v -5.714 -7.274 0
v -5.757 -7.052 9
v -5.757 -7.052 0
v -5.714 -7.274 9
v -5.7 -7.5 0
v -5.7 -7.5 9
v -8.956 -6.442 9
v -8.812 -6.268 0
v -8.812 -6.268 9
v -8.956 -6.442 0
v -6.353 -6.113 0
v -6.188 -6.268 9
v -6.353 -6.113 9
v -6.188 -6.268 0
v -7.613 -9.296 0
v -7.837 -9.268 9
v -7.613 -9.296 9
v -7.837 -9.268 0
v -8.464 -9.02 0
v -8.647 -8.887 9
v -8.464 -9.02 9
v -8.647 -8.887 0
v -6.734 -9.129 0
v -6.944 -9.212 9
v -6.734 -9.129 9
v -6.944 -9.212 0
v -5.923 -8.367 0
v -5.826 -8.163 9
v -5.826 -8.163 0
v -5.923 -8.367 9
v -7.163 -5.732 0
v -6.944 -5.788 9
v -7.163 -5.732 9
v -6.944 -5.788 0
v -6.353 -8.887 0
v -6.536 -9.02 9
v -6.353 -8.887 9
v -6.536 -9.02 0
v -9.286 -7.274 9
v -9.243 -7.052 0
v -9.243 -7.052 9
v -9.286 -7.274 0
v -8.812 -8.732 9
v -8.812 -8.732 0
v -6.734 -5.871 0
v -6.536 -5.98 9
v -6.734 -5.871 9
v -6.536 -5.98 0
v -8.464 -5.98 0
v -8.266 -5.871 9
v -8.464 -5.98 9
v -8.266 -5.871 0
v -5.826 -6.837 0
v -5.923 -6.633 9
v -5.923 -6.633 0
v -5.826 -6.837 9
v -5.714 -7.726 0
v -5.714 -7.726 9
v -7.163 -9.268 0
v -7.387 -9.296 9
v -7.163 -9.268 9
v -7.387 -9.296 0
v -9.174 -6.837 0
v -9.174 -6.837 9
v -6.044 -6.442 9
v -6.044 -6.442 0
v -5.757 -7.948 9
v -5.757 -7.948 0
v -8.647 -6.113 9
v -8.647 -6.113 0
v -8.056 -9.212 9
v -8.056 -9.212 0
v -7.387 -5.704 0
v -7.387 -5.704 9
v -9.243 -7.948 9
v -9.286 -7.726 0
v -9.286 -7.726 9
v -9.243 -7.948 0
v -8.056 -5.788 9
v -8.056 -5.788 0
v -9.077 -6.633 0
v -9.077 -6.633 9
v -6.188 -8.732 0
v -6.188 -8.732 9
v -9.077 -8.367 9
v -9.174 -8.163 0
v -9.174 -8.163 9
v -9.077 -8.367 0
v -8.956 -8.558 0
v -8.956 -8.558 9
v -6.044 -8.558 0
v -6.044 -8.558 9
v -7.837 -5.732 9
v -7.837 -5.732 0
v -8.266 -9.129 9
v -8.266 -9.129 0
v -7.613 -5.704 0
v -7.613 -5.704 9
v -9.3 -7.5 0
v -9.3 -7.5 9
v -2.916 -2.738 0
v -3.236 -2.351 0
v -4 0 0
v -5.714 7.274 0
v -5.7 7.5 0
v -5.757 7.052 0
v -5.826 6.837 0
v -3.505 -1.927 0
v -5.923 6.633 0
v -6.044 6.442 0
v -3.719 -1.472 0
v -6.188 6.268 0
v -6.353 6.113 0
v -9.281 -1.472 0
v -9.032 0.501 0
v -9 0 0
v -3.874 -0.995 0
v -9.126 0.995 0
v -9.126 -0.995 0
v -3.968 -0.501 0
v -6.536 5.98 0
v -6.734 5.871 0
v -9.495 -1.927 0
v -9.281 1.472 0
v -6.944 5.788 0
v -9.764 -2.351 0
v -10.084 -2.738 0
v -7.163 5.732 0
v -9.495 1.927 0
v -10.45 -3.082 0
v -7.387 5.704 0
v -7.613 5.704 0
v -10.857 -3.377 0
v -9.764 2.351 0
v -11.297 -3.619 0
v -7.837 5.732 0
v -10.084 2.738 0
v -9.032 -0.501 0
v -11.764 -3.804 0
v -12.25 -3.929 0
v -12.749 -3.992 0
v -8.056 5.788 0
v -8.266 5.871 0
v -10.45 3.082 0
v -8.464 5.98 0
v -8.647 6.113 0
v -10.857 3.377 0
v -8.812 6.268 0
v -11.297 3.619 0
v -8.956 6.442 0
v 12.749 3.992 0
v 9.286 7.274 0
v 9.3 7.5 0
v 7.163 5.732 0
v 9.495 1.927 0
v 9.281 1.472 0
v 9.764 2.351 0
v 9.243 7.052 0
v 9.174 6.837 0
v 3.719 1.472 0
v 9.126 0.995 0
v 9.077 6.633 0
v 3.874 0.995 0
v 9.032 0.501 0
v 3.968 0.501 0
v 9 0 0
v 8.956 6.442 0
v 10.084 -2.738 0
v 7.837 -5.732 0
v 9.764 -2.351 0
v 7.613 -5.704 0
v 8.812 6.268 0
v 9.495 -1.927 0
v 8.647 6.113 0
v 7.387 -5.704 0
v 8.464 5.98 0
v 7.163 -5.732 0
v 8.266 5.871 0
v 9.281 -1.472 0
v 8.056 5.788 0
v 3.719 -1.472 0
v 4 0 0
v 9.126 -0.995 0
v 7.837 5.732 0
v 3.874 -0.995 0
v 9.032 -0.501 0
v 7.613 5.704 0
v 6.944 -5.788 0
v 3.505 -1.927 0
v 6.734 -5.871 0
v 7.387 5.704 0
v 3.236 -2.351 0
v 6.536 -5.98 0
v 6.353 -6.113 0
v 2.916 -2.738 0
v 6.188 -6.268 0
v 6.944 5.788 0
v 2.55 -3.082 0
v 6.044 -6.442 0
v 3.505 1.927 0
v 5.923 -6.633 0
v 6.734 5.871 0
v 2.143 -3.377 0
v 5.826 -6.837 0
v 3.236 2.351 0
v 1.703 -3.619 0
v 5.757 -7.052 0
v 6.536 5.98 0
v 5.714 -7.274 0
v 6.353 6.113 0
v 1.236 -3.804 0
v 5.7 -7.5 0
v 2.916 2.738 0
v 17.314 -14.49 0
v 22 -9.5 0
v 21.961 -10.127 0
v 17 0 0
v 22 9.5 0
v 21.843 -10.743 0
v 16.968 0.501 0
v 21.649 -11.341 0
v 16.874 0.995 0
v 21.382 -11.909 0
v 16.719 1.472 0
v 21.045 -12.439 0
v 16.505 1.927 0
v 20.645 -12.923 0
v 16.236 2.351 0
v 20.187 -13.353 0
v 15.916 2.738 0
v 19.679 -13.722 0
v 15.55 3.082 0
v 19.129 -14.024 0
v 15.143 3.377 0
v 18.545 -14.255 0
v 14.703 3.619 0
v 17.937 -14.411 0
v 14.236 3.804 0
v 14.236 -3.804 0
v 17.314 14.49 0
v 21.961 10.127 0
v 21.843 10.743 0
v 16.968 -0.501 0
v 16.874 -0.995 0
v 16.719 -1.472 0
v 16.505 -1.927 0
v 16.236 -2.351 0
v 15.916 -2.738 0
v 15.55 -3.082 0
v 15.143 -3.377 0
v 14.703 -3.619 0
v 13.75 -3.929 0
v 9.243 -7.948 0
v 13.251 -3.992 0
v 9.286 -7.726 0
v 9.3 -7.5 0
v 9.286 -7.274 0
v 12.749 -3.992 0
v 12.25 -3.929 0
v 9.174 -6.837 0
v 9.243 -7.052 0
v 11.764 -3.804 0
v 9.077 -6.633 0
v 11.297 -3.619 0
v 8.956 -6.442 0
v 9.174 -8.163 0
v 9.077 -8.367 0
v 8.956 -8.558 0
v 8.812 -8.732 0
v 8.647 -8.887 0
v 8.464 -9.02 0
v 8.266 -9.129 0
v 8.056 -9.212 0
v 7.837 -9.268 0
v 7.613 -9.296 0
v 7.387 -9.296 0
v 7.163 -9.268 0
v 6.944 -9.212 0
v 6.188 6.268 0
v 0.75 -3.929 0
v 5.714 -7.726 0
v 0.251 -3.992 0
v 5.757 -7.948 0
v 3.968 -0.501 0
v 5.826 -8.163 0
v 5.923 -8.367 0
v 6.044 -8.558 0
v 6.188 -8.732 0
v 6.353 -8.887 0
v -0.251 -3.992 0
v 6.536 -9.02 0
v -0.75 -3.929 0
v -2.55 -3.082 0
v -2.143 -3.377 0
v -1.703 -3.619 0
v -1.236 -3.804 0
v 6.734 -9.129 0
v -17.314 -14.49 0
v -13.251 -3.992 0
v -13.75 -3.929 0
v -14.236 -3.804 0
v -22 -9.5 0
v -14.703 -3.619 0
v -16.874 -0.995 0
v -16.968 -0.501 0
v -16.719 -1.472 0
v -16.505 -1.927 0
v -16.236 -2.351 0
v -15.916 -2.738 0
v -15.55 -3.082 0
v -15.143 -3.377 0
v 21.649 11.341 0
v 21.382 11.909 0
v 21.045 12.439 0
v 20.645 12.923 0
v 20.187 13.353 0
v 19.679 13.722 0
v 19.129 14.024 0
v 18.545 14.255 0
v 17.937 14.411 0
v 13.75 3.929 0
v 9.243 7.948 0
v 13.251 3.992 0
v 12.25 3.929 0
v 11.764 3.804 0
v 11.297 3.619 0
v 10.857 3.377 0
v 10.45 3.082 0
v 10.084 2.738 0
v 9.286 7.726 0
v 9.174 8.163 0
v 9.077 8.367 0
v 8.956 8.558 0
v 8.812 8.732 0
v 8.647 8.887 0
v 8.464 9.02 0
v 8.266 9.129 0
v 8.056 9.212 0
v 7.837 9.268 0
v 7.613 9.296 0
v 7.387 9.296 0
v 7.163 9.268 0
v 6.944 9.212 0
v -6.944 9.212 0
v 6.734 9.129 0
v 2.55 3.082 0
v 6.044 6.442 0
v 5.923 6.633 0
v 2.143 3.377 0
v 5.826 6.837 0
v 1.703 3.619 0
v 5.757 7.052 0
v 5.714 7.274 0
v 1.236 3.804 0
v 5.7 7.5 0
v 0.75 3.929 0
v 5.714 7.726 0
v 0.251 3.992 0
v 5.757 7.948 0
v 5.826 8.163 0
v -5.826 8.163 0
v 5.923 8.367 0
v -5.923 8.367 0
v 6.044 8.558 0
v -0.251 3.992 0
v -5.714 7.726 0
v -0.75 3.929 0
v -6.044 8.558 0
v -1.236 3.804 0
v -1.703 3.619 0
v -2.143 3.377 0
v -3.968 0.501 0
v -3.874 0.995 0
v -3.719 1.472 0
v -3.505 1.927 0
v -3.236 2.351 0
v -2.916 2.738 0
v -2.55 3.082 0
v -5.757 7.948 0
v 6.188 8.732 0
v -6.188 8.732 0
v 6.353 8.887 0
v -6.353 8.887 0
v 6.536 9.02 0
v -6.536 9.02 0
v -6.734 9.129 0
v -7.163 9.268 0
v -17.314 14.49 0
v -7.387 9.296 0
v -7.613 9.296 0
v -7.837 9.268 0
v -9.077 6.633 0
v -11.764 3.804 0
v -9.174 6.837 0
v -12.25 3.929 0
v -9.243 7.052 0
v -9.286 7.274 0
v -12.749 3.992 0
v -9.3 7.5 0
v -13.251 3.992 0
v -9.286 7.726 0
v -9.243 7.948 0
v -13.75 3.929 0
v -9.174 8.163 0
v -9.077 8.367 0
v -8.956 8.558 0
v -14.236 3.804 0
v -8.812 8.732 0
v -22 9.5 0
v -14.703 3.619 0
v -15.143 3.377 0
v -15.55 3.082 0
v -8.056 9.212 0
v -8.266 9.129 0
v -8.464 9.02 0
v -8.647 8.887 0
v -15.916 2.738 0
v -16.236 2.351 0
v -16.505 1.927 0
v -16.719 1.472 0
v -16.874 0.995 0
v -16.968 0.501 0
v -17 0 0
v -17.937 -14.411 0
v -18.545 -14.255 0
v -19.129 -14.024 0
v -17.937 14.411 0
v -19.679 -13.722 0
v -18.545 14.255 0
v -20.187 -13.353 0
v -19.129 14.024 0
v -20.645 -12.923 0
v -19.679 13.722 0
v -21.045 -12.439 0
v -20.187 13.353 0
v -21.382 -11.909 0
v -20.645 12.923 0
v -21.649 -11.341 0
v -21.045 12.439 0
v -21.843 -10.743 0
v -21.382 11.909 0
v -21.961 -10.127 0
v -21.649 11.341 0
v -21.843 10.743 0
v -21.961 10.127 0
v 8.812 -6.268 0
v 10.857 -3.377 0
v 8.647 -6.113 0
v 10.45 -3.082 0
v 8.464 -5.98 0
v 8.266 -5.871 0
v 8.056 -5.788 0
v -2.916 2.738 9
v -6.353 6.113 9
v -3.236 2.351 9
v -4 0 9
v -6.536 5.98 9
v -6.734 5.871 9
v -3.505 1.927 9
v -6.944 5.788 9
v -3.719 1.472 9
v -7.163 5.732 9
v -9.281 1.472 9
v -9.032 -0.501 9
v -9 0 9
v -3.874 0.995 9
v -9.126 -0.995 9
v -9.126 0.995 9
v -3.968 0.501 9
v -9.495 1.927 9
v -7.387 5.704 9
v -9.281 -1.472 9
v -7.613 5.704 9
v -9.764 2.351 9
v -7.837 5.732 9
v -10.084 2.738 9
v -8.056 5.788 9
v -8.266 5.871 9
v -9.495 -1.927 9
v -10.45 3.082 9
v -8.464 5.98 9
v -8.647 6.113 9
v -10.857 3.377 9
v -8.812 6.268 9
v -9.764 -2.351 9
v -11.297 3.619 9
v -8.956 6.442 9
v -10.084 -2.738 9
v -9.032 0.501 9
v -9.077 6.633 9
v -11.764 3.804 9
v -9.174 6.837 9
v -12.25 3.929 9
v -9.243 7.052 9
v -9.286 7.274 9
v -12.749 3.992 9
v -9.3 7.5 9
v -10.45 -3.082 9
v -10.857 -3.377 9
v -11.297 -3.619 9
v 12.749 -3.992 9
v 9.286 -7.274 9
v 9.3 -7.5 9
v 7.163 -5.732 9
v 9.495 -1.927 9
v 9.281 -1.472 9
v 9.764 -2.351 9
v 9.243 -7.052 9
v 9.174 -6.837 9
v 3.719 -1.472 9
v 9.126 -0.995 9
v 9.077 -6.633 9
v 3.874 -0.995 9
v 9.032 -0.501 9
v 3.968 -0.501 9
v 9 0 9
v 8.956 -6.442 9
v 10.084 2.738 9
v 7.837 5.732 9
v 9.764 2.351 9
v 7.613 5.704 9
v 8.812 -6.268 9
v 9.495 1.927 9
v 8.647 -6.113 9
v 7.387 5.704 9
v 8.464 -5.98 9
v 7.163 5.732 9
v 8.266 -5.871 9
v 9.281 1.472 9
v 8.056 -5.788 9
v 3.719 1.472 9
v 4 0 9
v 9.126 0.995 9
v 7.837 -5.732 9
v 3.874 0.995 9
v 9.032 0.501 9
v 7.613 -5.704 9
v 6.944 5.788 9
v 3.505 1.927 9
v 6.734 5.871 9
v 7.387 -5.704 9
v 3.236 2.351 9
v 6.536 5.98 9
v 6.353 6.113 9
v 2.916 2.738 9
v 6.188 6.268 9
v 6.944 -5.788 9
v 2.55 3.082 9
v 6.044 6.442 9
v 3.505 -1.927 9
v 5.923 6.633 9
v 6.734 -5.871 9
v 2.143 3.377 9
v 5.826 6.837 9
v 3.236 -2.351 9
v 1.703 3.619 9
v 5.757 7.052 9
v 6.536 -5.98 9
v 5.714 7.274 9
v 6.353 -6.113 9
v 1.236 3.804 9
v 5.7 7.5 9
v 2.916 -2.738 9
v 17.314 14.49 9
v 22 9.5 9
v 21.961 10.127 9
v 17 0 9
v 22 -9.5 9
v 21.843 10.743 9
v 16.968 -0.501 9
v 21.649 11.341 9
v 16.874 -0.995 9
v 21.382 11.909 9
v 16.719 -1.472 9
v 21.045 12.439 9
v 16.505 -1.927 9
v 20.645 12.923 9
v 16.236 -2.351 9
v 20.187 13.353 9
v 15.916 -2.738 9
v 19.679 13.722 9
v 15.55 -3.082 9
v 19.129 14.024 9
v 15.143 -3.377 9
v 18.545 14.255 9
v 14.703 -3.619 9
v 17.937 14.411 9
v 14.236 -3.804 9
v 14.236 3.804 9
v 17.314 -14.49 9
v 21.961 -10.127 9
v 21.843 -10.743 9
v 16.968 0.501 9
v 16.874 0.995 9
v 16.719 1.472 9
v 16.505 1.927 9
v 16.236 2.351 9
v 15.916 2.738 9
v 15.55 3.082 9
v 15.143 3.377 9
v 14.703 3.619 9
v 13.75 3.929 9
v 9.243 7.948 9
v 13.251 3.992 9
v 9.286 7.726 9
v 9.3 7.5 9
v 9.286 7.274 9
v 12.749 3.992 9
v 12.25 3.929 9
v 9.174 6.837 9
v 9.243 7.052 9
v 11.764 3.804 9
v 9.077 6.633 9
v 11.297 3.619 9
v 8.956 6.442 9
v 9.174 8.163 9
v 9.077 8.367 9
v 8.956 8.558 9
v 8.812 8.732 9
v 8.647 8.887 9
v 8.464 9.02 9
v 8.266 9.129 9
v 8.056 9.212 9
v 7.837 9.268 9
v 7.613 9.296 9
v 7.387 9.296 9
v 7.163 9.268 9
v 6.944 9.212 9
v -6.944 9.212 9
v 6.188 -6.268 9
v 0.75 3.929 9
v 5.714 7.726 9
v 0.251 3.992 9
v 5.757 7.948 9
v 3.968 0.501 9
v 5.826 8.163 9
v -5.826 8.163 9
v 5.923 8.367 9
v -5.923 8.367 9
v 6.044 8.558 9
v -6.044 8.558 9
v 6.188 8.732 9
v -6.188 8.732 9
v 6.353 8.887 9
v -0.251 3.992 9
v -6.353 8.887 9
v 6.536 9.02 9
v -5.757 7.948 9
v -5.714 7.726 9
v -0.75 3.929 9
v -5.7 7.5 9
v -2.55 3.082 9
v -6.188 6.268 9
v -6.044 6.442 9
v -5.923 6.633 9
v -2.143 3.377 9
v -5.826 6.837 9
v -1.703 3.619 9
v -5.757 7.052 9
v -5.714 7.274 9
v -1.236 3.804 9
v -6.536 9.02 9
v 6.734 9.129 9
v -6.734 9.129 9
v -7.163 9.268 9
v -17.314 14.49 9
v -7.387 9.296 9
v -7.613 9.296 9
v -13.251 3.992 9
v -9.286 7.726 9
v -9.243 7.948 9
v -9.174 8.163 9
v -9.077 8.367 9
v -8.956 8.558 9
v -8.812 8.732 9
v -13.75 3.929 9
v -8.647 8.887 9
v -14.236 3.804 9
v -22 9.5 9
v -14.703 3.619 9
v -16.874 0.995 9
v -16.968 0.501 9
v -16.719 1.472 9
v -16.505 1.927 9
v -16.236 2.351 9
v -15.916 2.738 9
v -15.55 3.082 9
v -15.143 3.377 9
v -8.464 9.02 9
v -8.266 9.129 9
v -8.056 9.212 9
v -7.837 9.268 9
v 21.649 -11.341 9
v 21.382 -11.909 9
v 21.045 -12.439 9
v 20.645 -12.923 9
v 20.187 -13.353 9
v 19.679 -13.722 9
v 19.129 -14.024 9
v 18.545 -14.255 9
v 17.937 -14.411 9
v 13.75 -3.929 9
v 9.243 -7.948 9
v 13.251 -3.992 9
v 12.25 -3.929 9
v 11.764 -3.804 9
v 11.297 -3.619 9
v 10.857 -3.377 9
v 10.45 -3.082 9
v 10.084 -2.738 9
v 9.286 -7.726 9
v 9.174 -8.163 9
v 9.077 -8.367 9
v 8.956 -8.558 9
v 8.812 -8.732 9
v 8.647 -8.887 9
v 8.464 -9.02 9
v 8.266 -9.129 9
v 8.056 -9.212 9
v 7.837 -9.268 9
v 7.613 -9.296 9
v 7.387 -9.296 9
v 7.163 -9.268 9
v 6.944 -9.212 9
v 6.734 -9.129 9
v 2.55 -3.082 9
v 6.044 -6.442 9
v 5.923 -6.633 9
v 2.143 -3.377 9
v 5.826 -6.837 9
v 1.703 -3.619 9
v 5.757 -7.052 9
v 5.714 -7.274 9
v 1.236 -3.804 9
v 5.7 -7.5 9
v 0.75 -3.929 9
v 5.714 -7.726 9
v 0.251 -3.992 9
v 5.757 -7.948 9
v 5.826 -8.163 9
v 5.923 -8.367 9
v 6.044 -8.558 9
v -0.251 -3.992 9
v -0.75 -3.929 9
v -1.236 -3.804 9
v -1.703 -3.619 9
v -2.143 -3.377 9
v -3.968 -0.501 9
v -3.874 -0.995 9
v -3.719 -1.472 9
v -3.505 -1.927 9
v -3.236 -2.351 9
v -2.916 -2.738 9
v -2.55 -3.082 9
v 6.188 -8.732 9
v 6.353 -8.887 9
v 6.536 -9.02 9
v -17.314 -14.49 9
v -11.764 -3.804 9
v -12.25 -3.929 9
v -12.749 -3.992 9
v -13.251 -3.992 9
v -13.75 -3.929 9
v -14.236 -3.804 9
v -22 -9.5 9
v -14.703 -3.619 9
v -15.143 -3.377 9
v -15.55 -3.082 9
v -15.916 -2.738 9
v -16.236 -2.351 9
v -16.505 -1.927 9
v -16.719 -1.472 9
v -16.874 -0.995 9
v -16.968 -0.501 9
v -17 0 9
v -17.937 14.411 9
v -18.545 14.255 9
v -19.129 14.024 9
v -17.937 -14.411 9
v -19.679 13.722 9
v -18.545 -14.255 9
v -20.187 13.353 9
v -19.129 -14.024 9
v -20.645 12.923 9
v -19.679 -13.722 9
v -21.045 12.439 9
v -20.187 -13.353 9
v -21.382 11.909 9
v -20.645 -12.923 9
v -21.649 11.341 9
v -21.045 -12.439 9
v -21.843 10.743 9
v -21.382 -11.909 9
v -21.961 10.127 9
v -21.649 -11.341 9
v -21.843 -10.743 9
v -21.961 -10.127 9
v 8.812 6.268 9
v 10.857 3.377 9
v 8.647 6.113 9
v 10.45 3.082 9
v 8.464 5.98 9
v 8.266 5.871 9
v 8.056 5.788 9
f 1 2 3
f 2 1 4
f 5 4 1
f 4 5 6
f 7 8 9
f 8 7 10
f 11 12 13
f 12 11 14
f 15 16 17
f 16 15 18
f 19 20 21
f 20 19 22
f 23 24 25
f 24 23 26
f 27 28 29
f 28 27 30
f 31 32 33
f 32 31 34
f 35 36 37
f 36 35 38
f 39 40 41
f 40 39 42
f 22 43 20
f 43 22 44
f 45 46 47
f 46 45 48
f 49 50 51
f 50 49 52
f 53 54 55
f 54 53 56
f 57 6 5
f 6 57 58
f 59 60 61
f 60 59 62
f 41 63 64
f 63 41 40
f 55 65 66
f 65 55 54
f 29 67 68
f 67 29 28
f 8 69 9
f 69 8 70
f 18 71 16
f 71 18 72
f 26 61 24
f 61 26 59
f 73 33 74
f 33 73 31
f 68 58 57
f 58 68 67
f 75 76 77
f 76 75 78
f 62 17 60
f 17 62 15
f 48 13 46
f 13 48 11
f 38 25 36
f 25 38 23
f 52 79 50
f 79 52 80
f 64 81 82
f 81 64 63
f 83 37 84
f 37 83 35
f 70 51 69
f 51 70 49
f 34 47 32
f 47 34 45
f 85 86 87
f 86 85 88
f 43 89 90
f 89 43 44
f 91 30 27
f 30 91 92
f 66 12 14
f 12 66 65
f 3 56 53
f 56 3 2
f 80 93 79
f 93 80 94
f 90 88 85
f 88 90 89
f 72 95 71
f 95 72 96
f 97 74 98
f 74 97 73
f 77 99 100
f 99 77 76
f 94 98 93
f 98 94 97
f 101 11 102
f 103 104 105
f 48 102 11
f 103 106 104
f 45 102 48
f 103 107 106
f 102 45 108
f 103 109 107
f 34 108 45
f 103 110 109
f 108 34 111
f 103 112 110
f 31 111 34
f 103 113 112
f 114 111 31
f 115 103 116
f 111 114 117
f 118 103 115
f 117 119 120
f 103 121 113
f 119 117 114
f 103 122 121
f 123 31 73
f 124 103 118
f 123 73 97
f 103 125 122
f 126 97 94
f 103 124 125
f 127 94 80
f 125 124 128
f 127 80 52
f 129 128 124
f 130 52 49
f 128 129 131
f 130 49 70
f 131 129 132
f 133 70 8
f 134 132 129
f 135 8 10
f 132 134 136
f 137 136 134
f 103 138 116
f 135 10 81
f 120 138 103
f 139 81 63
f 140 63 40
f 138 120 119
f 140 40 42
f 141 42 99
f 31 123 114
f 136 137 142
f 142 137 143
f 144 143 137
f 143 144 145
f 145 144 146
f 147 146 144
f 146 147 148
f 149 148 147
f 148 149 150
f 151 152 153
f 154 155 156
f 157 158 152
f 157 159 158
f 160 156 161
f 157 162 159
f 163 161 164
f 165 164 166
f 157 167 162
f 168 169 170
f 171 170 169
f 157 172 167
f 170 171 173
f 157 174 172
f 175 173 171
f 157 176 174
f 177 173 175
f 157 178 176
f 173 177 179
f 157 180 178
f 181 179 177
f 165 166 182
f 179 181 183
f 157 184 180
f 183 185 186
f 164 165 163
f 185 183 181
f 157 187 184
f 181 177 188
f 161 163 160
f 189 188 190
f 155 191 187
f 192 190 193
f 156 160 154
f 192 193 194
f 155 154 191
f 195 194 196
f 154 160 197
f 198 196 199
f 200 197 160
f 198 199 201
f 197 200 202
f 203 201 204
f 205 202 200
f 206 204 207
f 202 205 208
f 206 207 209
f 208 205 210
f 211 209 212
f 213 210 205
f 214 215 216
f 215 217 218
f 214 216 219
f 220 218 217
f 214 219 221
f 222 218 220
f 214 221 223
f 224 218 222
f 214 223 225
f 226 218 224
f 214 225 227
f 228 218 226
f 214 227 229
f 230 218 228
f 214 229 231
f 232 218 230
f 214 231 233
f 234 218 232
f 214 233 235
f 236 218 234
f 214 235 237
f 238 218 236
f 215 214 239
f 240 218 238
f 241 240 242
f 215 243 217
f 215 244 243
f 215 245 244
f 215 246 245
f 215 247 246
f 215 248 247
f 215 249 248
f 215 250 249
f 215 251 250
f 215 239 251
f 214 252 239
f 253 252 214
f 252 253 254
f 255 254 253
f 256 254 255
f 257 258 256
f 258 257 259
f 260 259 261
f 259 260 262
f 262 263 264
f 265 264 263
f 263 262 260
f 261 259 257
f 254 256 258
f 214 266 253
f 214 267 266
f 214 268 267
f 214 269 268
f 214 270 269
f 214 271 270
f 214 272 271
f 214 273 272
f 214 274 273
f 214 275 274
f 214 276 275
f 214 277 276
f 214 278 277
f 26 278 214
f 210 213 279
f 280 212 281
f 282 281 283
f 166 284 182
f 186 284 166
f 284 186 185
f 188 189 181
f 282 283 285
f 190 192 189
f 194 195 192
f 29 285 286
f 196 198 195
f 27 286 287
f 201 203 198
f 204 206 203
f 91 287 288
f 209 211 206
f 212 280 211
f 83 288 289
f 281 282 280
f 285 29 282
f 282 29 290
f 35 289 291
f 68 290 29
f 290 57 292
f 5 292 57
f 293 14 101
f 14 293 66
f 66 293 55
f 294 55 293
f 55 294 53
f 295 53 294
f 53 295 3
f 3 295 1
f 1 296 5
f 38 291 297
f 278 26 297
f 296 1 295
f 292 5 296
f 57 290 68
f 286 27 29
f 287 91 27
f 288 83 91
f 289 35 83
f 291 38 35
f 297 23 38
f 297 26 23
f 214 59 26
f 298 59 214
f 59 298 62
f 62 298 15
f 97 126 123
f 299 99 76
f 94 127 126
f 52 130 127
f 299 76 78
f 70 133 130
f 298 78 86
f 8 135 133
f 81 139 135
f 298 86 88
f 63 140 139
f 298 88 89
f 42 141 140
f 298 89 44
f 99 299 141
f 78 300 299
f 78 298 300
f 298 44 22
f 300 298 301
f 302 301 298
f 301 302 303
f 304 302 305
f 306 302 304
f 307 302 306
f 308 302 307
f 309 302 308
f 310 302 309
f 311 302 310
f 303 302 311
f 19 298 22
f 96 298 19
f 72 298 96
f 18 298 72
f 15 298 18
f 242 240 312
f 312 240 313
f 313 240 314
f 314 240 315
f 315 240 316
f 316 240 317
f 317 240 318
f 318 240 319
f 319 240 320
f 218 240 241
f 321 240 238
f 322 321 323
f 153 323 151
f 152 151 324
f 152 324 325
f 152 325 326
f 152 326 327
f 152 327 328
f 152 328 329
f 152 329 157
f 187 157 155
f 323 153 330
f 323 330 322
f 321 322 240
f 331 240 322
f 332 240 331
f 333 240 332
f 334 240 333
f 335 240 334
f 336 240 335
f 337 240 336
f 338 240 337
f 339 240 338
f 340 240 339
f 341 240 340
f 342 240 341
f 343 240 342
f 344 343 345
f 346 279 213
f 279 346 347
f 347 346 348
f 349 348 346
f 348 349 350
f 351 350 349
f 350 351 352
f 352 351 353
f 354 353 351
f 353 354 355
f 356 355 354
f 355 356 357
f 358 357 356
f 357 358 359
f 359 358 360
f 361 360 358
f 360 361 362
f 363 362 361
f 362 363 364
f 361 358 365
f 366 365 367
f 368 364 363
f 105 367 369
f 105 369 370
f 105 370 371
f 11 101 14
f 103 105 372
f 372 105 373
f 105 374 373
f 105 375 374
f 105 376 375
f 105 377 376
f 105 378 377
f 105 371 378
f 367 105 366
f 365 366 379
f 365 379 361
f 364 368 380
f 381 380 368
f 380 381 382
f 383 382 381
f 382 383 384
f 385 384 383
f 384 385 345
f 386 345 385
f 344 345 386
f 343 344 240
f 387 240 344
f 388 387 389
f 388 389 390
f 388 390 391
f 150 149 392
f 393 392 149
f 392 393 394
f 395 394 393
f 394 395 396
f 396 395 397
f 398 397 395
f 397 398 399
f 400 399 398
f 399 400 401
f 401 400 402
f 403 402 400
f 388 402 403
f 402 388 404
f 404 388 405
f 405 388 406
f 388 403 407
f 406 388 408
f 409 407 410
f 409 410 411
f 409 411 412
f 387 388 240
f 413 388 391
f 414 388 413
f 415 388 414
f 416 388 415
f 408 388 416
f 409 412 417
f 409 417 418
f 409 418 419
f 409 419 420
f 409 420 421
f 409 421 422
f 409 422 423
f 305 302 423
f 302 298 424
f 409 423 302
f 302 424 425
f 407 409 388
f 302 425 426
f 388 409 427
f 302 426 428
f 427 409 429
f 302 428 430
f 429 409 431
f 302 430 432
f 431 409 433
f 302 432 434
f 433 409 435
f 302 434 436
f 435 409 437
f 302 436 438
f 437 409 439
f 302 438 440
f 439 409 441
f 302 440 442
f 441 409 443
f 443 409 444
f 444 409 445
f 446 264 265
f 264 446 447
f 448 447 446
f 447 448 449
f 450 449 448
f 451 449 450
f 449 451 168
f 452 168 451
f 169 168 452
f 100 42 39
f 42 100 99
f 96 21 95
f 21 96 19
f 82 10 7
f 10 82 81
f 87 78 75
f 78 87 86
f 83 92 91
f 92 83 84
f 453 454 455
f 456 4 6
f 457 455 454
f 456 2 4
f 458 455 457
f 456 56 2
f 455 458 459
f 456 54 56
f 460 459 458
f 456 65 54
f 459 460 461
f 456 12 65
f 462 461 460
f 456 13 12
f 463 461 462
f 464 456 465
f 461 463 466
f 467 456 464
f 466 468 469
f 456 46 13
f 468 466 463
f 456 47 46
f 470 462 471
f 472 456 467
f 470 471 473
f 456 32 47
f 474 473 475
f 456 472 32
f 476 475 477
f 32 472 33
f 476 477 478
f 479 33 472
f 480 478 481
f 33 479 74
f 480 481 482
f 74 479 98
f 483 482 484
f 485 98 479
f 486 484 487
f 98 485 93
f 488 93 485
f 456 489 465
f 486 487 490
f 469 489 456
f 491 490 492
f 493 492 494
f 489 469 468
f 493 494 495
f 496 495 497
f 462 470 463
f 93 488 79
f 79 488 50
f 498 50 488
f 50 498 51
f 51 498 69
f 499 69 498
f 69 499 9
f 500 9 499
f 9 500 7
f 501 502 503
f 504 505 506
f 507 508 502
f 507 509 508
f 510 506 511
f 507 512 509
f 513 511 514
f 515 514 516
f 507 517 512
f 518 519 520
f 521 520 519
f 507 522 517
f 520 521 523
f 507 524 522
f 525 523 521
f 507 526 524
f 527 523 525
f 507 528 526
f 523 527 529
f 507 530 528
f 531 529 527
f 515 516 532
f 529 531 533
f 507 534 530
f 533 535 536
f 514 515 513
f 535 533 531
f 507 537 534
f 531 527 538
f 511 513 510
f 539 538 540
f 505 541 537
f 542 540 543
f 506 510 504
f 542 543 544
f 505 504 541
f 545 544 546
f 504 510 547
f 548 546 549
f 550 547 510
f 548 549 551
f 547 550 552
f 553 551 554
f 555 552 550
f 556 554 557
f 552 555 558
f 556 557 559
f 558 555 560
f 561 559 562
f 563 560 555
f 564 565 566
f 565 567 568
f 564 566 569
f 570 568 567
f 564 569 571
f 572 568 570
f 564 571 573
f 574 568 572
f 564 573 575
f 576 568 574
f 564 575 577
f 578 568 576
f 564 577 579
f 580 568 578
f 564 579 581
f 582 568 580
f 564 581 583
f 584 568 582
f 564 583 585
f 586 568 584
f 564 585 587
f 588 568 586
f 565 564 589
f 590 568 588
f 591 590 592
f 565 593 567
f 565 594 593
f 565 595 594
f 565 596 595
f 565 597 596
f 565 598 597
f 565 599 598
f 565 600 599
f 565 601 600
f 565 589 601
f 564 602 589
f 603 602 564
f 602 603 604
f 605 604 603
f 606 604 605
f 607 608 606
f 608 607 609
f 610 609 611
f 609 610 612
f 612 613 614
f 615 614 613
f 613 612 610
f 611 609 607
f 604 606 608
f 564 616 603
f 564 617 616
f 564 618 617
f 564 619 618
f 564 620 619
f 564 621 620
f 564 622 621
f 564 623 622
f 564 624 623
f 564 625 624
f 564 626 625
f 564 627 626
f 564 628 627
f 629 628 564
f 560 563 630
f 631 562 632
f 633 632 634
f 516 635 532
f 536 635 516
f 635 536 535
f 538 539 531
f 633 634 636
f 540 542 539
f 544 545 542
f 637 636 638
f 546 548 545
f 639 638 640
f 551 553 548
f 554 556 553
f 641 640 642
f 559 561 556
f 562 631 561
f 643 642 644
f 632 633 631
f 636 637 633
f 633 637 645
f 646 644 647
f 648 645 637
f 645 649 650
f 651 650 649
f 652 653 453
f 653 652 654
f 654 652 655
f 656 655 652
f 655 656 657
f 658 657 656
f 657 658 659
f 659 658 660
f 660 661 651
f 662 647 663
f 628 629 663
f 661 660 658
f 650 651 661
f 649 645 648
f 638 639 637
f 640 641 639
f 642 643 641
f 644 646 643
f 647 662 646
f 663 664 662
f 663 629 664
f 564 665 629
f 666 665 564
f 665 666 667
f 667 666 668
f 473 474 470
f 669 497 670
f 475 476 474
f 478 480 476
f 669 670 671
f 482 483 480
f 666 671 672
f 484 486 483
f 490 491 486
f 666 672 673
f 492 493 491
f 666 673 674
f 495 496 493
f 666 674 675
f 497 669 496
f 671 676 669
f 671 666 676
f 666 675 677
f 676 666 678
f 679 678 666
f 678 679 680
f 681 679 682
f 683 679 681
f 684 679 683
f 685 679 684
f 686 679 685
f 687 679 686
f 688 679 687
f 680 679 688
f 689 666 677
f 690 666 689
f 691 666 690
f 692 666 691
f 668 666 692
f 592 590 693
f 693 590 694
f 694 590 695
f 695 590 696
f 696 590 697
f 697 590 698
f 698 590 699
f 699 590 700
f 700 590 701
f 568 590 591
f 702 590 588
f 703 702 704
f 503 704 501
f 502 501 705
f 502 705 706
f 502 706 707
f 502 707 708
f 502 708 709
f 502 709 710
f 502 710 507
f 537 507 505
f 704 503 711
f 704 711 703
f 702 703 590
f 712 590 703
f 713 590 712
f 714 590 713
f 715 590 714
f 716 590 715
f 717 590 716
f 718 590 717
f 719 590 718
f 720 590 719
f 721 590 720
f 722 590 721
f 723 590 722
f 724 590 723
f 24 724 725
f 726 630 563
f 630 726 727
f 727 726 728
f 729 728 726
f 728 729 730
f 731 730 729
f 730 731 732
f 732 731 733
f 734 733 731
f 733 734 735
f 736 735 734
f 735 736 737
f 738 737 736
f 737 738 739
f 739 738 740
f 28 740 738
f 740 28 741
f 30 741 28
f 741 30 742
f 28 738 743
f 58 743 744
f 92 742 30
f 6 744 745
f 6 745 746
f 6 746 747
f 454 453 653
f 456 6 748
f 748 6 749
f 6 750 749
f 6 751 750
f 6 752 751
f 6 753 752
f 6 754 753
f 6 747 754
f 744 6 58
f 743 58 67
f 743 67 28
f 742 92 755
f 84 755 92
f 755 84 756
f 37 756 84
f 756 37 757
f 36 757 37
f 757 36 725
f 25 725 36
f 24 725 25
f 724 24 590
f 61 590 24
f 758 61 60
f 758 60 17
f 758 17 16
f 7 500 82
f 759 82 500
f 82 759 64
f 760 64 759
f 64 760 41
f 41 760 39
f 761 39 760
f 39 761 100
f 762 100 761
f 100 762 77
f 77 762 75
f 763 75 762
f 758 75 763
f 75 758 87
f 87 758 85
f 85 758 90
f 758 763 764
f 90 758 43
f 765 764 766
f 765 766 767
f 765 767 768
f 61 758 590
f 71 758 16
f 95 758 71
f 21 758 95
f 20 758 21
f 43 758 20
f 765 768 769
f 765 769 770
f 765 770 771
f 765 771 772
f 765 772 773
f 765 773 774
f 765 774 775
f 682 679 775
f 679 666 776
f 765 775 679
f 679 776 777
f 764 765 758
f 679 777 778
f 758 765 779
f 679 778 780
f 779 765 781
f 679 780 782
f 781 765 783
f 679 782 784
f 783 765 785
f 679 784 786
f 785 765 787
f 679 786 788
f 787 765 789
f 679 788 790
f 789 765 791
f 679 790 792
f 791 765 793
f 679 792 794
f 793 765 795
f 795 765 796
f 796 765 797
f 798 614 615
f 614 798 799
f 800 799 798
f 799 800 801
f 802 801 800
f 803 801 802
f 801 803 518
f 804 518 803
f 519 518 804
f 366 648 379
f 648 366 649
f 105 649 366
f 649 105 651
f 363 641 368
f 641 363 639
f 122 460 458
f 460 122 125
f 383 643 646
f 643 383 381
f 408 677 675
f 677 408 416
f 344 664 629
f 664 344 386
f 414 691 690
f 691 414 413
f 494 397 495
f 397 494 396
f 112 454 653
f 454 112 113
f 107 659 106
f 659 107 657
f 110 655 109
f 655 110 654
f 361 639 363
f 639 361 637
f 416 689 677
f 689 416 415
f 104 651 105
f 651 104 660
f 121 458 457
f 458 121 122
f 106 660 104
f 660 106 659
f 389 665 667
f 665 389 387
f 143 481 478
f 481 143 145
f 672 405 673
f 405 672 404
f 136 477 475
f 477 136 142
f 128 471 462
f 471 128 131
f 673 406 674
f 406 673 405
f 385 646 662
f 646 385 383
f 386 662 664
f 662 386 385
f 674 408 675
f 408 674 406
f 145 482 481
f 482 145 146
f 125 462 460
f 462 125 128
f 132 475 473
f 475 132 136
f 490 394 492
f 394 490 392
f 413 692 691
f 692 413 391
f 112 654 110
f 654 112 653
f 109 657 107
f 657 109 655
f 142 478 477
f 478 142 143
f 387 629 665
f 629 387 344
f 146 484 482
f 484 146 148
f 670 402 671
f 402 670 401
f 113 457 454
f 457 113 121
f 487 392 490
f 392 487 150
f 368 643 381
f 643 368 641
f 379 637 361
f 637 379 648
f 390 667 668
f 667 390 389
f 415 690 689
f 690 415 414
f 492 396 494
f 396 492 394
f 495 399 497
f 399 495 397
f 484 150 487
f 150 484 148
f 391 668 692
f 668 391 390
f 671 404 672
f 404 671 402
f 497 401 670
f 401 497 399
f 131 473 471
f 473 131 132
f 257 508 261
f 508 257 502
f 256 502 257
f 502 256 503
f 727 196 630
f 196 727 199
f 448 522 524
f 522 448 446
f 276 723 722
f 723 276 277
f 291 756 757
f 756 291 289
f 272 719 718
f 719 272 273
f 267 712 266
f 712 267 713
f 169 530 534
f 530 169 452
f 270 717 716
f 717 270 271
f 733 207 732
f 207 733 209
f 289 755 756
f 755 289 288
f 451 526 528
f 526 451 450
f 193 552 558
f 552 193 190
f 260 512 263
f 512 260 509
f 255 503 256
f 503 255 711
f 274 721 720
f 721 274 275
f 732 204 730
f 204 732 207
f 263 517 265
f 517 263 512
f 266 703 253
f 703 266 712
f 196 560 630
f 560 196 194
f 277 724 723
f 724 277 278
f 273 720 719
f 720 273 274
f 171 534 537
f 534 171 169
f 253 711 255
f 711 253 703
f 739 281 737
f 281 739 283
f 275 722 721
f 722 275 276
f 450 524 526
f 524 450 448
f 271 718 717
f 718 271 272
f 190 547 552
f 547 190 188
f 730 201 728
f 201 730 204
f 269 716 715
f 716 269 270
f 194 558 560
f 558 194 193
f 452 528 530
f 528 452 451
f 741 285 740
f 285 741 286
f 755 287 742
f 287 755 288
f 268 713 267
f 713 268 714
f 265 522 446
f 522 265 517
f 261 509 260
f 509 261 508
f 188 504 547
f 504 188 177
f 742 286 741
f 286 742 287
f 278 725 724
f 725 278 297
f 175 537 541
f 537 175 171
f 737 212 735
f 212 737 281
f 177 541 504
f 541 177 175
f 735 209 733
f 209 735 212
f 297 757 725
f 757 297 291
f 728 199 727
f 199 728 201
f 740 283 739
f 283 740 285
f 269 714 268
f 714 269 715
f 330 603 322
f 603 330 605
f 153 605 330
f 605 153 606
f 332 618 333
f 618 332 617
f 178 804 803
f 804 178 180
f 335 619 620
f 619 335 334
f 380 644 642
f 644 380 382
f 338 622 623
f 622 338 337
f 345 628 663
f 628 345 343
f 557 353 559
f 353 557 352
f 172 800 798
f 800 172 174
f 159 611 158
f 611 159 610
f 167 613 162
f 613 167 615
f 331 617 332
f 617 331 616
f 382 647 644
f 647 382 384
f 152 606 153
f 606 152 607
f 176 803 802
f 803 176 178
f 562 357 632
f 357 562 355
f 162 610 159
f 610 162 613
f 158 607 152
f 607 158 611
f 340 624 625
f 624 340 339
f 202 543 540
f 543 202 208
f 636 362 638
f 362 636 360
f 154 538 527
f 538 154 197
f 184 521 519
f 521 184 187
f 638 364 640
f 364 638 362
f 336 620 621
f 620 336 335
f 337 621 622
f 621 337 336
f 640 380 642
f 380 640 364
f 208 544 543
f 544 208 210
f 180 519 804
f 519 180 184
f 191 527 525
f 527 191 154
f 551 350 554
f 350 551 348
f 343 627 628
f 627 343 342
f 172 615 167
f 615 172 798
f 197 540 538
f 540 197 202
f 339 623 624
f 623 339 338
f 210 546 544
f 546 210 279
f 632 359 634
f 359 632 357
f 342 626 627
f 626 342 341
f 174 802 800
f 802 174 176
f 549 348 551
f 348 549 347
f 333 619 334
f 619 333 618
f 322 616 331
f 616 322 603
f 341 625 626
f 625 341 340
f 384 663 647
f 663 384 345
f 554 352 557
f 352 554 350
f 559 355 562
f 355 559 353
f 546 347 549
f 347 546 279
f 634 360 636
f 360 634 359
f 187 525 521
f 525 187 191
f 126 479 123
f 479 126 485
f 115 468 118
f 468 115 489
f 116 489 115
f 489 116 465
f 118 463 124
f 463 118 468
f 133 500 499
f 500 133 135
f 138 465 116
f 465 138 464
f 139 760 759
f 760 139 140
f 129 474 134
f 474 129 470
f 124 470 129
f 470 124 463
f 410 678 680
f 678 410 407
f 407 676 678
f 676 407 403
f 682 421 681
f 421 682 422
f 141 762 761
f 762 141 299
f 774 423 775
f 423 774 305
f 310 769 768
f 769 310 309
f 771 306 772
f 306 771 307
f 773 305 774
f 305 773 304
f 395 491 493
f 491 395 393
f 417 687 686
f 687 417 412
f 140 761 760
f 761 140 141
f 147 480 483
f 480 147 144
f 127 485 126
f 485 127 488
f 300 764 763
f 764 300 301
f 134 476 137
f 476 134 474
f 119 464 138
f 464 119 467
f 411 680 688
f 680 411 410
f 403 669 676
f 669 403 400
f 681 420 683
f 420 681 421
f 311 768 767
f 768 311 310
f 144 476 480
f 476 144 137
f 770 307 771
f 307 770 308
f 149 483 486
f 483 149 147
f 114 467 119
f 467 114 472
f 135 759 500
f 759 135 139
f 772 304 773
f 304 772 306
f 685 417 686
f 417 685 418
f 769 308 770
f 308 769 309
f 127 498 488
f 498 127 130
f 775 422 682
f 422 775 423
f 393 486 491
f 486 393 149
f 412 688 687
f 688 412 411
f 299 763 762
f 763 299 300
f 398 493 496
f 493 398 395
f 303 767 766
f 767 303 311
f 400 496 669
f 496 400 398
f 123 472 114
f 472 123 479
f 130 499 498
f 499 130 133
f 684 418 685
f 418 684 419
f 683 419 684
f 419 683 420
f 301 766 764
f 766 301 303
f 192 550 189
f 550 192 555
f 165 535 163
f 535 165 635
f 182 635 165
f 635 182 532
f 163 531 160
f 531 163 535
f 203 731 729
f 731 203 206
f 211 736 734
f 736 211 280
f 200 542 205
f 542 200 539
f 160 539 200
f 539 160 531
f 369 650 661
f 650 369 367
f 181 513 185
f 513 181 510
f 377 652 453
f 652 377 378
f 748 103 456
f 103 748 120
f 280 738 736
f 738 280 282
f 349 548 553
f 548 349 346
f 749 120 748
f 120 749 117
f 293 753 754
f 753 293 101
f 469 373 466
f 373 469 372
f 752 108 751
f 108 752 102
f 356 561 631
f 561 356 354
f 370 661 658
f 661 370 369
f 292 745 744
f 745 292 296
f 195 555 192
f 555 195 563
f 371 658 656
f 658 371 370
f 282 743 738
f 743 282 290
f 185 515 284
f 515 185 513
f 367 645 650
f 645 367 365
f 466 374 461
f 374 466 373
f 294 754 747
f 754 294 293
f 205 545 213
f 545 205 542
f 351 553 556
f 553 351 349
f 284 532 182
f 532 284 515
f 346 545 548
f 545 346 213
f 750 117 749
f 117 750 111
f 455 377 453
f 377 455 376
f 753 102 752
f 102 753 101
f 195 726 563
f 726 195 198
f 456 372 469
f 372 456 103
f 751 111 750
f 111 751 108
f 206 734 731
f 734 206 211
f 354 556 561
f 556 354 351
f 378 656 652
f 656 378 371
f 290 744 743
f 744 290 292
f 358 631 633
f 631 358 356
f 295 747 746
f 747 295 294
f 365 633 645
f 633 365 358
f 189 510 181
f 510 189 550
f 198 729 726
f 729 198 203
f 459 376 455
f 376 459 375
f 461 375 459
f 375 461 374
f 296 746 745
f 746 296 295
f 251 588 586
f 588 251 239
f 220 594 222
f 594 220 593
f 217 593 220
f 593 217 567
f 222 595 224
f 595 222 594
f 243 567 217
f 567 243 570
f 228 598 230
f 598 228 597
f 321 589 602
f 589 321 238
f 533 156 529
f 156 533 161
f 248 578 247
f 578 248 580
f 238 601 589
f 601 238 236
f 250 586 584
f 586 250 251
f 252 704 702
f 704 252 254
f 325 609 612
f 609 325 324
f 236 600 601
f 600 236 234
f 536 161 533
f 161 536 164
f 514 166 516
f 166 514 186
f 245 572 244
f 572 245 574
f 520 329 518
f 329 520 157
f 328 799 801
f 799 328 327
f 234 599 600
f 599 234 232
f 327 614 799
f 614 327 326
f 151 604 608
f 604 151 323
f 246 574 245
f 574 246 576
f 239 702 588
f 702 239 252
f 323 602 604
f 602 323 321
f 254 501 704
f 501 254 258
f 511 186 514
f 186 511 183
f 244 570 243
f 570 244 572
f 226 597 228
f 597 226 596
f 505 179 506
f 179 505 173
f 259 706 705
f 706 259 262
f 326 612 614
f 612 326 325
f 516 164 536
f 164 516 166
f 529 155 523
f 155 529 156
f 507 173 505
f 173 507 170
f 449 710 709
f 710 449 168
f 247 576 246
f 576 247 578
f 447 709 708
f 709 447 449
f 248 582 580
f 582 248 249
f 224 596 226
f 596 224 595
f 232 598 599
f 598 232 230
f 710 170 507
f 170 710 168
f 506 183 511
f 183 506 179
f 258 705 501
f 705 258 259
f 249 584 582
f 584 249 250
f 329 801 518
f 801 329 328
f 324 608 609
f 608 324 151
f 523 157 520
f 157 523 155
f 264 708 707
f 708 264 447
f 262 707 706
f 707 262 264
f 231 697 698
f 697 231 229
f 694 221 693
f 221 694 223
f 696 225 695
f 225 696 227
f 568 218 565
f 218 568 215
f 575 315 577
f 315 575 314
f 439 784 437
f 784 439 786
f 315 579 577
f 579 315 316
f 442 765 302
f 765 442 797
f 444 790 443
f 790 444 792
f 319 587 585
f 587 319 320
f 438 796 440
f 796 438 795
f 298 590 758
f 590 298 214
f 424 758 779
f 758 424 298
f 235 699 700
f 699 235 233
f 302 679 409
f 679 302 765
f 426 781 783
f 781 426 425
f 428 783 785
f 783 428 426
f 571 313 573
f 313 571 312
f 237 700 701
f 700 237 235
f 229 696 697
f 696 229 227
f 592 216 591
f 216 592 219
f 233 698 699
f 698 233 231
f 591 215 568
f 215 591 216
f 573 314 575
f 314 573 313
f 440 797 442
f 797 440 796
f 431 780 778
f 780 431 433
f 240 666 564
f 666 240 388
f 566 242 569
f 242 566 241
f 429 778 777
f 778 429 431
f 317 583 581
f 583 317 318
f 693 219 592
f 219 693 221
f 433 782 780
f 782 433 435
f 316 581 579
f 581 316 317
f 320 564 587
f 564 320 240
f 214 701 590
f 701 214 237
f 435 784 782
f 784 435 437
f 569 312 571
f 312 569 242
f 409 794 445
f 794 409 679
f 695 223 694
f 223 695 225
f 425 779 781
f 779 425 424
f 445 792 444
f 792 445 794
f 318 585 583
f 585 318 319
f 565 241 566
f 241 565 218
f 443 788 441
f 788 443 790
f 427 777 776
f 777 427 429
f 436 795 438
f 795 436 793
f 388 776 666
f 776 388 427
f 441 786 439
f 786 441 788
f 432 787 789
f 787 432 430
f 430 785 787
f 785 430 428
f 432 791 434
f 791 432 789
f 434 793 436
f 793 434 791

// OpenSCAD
$fn = 50;

difference() {
	union() {
		hull() {
			translate(v = [-17.0, 9.5, 0]) {
				cylinder(h = 9, r = 5);
			}
			translate(v = [17.0, 9.5, 0]) {
				cylinder(h = 9, r = 5);
			}
			translate(v = [-17.0, -9.5, 0]) {
				cylinder(h = 9, r = 5);
			}
			translate(v = [17.0, -9.5, 0]) {
				cylinder(h = 9, r = 5);
			}
		}
	}
	union() {
		translate(v = [-7.5, -7.5, 0]) {
			cylinder(h = 9, r = 1.8);
		}
		translate(v = [-7.5, 7.5, 0]) {
			cylinder(h = 9, r = 1.8);
		}
		translate(v = [7.5, -7.5, 0]) {
			cylinder(h = 9, r = 1.8);
		}
		translate(v = [7.5, 7.5, 0]) {
			cylinder(h = 9, r = 1.8);
		}
		translate(v = [-13.0, 0, 0.0]) {
			cylinder(h = 9, r = 4.0);
		}
		cylinder(h = 9, r = 4.0);
		translate(v = [13.0, 0, 0.0]) {
			cylinder(h = 9, r = 4.0);
		}
	}
}
